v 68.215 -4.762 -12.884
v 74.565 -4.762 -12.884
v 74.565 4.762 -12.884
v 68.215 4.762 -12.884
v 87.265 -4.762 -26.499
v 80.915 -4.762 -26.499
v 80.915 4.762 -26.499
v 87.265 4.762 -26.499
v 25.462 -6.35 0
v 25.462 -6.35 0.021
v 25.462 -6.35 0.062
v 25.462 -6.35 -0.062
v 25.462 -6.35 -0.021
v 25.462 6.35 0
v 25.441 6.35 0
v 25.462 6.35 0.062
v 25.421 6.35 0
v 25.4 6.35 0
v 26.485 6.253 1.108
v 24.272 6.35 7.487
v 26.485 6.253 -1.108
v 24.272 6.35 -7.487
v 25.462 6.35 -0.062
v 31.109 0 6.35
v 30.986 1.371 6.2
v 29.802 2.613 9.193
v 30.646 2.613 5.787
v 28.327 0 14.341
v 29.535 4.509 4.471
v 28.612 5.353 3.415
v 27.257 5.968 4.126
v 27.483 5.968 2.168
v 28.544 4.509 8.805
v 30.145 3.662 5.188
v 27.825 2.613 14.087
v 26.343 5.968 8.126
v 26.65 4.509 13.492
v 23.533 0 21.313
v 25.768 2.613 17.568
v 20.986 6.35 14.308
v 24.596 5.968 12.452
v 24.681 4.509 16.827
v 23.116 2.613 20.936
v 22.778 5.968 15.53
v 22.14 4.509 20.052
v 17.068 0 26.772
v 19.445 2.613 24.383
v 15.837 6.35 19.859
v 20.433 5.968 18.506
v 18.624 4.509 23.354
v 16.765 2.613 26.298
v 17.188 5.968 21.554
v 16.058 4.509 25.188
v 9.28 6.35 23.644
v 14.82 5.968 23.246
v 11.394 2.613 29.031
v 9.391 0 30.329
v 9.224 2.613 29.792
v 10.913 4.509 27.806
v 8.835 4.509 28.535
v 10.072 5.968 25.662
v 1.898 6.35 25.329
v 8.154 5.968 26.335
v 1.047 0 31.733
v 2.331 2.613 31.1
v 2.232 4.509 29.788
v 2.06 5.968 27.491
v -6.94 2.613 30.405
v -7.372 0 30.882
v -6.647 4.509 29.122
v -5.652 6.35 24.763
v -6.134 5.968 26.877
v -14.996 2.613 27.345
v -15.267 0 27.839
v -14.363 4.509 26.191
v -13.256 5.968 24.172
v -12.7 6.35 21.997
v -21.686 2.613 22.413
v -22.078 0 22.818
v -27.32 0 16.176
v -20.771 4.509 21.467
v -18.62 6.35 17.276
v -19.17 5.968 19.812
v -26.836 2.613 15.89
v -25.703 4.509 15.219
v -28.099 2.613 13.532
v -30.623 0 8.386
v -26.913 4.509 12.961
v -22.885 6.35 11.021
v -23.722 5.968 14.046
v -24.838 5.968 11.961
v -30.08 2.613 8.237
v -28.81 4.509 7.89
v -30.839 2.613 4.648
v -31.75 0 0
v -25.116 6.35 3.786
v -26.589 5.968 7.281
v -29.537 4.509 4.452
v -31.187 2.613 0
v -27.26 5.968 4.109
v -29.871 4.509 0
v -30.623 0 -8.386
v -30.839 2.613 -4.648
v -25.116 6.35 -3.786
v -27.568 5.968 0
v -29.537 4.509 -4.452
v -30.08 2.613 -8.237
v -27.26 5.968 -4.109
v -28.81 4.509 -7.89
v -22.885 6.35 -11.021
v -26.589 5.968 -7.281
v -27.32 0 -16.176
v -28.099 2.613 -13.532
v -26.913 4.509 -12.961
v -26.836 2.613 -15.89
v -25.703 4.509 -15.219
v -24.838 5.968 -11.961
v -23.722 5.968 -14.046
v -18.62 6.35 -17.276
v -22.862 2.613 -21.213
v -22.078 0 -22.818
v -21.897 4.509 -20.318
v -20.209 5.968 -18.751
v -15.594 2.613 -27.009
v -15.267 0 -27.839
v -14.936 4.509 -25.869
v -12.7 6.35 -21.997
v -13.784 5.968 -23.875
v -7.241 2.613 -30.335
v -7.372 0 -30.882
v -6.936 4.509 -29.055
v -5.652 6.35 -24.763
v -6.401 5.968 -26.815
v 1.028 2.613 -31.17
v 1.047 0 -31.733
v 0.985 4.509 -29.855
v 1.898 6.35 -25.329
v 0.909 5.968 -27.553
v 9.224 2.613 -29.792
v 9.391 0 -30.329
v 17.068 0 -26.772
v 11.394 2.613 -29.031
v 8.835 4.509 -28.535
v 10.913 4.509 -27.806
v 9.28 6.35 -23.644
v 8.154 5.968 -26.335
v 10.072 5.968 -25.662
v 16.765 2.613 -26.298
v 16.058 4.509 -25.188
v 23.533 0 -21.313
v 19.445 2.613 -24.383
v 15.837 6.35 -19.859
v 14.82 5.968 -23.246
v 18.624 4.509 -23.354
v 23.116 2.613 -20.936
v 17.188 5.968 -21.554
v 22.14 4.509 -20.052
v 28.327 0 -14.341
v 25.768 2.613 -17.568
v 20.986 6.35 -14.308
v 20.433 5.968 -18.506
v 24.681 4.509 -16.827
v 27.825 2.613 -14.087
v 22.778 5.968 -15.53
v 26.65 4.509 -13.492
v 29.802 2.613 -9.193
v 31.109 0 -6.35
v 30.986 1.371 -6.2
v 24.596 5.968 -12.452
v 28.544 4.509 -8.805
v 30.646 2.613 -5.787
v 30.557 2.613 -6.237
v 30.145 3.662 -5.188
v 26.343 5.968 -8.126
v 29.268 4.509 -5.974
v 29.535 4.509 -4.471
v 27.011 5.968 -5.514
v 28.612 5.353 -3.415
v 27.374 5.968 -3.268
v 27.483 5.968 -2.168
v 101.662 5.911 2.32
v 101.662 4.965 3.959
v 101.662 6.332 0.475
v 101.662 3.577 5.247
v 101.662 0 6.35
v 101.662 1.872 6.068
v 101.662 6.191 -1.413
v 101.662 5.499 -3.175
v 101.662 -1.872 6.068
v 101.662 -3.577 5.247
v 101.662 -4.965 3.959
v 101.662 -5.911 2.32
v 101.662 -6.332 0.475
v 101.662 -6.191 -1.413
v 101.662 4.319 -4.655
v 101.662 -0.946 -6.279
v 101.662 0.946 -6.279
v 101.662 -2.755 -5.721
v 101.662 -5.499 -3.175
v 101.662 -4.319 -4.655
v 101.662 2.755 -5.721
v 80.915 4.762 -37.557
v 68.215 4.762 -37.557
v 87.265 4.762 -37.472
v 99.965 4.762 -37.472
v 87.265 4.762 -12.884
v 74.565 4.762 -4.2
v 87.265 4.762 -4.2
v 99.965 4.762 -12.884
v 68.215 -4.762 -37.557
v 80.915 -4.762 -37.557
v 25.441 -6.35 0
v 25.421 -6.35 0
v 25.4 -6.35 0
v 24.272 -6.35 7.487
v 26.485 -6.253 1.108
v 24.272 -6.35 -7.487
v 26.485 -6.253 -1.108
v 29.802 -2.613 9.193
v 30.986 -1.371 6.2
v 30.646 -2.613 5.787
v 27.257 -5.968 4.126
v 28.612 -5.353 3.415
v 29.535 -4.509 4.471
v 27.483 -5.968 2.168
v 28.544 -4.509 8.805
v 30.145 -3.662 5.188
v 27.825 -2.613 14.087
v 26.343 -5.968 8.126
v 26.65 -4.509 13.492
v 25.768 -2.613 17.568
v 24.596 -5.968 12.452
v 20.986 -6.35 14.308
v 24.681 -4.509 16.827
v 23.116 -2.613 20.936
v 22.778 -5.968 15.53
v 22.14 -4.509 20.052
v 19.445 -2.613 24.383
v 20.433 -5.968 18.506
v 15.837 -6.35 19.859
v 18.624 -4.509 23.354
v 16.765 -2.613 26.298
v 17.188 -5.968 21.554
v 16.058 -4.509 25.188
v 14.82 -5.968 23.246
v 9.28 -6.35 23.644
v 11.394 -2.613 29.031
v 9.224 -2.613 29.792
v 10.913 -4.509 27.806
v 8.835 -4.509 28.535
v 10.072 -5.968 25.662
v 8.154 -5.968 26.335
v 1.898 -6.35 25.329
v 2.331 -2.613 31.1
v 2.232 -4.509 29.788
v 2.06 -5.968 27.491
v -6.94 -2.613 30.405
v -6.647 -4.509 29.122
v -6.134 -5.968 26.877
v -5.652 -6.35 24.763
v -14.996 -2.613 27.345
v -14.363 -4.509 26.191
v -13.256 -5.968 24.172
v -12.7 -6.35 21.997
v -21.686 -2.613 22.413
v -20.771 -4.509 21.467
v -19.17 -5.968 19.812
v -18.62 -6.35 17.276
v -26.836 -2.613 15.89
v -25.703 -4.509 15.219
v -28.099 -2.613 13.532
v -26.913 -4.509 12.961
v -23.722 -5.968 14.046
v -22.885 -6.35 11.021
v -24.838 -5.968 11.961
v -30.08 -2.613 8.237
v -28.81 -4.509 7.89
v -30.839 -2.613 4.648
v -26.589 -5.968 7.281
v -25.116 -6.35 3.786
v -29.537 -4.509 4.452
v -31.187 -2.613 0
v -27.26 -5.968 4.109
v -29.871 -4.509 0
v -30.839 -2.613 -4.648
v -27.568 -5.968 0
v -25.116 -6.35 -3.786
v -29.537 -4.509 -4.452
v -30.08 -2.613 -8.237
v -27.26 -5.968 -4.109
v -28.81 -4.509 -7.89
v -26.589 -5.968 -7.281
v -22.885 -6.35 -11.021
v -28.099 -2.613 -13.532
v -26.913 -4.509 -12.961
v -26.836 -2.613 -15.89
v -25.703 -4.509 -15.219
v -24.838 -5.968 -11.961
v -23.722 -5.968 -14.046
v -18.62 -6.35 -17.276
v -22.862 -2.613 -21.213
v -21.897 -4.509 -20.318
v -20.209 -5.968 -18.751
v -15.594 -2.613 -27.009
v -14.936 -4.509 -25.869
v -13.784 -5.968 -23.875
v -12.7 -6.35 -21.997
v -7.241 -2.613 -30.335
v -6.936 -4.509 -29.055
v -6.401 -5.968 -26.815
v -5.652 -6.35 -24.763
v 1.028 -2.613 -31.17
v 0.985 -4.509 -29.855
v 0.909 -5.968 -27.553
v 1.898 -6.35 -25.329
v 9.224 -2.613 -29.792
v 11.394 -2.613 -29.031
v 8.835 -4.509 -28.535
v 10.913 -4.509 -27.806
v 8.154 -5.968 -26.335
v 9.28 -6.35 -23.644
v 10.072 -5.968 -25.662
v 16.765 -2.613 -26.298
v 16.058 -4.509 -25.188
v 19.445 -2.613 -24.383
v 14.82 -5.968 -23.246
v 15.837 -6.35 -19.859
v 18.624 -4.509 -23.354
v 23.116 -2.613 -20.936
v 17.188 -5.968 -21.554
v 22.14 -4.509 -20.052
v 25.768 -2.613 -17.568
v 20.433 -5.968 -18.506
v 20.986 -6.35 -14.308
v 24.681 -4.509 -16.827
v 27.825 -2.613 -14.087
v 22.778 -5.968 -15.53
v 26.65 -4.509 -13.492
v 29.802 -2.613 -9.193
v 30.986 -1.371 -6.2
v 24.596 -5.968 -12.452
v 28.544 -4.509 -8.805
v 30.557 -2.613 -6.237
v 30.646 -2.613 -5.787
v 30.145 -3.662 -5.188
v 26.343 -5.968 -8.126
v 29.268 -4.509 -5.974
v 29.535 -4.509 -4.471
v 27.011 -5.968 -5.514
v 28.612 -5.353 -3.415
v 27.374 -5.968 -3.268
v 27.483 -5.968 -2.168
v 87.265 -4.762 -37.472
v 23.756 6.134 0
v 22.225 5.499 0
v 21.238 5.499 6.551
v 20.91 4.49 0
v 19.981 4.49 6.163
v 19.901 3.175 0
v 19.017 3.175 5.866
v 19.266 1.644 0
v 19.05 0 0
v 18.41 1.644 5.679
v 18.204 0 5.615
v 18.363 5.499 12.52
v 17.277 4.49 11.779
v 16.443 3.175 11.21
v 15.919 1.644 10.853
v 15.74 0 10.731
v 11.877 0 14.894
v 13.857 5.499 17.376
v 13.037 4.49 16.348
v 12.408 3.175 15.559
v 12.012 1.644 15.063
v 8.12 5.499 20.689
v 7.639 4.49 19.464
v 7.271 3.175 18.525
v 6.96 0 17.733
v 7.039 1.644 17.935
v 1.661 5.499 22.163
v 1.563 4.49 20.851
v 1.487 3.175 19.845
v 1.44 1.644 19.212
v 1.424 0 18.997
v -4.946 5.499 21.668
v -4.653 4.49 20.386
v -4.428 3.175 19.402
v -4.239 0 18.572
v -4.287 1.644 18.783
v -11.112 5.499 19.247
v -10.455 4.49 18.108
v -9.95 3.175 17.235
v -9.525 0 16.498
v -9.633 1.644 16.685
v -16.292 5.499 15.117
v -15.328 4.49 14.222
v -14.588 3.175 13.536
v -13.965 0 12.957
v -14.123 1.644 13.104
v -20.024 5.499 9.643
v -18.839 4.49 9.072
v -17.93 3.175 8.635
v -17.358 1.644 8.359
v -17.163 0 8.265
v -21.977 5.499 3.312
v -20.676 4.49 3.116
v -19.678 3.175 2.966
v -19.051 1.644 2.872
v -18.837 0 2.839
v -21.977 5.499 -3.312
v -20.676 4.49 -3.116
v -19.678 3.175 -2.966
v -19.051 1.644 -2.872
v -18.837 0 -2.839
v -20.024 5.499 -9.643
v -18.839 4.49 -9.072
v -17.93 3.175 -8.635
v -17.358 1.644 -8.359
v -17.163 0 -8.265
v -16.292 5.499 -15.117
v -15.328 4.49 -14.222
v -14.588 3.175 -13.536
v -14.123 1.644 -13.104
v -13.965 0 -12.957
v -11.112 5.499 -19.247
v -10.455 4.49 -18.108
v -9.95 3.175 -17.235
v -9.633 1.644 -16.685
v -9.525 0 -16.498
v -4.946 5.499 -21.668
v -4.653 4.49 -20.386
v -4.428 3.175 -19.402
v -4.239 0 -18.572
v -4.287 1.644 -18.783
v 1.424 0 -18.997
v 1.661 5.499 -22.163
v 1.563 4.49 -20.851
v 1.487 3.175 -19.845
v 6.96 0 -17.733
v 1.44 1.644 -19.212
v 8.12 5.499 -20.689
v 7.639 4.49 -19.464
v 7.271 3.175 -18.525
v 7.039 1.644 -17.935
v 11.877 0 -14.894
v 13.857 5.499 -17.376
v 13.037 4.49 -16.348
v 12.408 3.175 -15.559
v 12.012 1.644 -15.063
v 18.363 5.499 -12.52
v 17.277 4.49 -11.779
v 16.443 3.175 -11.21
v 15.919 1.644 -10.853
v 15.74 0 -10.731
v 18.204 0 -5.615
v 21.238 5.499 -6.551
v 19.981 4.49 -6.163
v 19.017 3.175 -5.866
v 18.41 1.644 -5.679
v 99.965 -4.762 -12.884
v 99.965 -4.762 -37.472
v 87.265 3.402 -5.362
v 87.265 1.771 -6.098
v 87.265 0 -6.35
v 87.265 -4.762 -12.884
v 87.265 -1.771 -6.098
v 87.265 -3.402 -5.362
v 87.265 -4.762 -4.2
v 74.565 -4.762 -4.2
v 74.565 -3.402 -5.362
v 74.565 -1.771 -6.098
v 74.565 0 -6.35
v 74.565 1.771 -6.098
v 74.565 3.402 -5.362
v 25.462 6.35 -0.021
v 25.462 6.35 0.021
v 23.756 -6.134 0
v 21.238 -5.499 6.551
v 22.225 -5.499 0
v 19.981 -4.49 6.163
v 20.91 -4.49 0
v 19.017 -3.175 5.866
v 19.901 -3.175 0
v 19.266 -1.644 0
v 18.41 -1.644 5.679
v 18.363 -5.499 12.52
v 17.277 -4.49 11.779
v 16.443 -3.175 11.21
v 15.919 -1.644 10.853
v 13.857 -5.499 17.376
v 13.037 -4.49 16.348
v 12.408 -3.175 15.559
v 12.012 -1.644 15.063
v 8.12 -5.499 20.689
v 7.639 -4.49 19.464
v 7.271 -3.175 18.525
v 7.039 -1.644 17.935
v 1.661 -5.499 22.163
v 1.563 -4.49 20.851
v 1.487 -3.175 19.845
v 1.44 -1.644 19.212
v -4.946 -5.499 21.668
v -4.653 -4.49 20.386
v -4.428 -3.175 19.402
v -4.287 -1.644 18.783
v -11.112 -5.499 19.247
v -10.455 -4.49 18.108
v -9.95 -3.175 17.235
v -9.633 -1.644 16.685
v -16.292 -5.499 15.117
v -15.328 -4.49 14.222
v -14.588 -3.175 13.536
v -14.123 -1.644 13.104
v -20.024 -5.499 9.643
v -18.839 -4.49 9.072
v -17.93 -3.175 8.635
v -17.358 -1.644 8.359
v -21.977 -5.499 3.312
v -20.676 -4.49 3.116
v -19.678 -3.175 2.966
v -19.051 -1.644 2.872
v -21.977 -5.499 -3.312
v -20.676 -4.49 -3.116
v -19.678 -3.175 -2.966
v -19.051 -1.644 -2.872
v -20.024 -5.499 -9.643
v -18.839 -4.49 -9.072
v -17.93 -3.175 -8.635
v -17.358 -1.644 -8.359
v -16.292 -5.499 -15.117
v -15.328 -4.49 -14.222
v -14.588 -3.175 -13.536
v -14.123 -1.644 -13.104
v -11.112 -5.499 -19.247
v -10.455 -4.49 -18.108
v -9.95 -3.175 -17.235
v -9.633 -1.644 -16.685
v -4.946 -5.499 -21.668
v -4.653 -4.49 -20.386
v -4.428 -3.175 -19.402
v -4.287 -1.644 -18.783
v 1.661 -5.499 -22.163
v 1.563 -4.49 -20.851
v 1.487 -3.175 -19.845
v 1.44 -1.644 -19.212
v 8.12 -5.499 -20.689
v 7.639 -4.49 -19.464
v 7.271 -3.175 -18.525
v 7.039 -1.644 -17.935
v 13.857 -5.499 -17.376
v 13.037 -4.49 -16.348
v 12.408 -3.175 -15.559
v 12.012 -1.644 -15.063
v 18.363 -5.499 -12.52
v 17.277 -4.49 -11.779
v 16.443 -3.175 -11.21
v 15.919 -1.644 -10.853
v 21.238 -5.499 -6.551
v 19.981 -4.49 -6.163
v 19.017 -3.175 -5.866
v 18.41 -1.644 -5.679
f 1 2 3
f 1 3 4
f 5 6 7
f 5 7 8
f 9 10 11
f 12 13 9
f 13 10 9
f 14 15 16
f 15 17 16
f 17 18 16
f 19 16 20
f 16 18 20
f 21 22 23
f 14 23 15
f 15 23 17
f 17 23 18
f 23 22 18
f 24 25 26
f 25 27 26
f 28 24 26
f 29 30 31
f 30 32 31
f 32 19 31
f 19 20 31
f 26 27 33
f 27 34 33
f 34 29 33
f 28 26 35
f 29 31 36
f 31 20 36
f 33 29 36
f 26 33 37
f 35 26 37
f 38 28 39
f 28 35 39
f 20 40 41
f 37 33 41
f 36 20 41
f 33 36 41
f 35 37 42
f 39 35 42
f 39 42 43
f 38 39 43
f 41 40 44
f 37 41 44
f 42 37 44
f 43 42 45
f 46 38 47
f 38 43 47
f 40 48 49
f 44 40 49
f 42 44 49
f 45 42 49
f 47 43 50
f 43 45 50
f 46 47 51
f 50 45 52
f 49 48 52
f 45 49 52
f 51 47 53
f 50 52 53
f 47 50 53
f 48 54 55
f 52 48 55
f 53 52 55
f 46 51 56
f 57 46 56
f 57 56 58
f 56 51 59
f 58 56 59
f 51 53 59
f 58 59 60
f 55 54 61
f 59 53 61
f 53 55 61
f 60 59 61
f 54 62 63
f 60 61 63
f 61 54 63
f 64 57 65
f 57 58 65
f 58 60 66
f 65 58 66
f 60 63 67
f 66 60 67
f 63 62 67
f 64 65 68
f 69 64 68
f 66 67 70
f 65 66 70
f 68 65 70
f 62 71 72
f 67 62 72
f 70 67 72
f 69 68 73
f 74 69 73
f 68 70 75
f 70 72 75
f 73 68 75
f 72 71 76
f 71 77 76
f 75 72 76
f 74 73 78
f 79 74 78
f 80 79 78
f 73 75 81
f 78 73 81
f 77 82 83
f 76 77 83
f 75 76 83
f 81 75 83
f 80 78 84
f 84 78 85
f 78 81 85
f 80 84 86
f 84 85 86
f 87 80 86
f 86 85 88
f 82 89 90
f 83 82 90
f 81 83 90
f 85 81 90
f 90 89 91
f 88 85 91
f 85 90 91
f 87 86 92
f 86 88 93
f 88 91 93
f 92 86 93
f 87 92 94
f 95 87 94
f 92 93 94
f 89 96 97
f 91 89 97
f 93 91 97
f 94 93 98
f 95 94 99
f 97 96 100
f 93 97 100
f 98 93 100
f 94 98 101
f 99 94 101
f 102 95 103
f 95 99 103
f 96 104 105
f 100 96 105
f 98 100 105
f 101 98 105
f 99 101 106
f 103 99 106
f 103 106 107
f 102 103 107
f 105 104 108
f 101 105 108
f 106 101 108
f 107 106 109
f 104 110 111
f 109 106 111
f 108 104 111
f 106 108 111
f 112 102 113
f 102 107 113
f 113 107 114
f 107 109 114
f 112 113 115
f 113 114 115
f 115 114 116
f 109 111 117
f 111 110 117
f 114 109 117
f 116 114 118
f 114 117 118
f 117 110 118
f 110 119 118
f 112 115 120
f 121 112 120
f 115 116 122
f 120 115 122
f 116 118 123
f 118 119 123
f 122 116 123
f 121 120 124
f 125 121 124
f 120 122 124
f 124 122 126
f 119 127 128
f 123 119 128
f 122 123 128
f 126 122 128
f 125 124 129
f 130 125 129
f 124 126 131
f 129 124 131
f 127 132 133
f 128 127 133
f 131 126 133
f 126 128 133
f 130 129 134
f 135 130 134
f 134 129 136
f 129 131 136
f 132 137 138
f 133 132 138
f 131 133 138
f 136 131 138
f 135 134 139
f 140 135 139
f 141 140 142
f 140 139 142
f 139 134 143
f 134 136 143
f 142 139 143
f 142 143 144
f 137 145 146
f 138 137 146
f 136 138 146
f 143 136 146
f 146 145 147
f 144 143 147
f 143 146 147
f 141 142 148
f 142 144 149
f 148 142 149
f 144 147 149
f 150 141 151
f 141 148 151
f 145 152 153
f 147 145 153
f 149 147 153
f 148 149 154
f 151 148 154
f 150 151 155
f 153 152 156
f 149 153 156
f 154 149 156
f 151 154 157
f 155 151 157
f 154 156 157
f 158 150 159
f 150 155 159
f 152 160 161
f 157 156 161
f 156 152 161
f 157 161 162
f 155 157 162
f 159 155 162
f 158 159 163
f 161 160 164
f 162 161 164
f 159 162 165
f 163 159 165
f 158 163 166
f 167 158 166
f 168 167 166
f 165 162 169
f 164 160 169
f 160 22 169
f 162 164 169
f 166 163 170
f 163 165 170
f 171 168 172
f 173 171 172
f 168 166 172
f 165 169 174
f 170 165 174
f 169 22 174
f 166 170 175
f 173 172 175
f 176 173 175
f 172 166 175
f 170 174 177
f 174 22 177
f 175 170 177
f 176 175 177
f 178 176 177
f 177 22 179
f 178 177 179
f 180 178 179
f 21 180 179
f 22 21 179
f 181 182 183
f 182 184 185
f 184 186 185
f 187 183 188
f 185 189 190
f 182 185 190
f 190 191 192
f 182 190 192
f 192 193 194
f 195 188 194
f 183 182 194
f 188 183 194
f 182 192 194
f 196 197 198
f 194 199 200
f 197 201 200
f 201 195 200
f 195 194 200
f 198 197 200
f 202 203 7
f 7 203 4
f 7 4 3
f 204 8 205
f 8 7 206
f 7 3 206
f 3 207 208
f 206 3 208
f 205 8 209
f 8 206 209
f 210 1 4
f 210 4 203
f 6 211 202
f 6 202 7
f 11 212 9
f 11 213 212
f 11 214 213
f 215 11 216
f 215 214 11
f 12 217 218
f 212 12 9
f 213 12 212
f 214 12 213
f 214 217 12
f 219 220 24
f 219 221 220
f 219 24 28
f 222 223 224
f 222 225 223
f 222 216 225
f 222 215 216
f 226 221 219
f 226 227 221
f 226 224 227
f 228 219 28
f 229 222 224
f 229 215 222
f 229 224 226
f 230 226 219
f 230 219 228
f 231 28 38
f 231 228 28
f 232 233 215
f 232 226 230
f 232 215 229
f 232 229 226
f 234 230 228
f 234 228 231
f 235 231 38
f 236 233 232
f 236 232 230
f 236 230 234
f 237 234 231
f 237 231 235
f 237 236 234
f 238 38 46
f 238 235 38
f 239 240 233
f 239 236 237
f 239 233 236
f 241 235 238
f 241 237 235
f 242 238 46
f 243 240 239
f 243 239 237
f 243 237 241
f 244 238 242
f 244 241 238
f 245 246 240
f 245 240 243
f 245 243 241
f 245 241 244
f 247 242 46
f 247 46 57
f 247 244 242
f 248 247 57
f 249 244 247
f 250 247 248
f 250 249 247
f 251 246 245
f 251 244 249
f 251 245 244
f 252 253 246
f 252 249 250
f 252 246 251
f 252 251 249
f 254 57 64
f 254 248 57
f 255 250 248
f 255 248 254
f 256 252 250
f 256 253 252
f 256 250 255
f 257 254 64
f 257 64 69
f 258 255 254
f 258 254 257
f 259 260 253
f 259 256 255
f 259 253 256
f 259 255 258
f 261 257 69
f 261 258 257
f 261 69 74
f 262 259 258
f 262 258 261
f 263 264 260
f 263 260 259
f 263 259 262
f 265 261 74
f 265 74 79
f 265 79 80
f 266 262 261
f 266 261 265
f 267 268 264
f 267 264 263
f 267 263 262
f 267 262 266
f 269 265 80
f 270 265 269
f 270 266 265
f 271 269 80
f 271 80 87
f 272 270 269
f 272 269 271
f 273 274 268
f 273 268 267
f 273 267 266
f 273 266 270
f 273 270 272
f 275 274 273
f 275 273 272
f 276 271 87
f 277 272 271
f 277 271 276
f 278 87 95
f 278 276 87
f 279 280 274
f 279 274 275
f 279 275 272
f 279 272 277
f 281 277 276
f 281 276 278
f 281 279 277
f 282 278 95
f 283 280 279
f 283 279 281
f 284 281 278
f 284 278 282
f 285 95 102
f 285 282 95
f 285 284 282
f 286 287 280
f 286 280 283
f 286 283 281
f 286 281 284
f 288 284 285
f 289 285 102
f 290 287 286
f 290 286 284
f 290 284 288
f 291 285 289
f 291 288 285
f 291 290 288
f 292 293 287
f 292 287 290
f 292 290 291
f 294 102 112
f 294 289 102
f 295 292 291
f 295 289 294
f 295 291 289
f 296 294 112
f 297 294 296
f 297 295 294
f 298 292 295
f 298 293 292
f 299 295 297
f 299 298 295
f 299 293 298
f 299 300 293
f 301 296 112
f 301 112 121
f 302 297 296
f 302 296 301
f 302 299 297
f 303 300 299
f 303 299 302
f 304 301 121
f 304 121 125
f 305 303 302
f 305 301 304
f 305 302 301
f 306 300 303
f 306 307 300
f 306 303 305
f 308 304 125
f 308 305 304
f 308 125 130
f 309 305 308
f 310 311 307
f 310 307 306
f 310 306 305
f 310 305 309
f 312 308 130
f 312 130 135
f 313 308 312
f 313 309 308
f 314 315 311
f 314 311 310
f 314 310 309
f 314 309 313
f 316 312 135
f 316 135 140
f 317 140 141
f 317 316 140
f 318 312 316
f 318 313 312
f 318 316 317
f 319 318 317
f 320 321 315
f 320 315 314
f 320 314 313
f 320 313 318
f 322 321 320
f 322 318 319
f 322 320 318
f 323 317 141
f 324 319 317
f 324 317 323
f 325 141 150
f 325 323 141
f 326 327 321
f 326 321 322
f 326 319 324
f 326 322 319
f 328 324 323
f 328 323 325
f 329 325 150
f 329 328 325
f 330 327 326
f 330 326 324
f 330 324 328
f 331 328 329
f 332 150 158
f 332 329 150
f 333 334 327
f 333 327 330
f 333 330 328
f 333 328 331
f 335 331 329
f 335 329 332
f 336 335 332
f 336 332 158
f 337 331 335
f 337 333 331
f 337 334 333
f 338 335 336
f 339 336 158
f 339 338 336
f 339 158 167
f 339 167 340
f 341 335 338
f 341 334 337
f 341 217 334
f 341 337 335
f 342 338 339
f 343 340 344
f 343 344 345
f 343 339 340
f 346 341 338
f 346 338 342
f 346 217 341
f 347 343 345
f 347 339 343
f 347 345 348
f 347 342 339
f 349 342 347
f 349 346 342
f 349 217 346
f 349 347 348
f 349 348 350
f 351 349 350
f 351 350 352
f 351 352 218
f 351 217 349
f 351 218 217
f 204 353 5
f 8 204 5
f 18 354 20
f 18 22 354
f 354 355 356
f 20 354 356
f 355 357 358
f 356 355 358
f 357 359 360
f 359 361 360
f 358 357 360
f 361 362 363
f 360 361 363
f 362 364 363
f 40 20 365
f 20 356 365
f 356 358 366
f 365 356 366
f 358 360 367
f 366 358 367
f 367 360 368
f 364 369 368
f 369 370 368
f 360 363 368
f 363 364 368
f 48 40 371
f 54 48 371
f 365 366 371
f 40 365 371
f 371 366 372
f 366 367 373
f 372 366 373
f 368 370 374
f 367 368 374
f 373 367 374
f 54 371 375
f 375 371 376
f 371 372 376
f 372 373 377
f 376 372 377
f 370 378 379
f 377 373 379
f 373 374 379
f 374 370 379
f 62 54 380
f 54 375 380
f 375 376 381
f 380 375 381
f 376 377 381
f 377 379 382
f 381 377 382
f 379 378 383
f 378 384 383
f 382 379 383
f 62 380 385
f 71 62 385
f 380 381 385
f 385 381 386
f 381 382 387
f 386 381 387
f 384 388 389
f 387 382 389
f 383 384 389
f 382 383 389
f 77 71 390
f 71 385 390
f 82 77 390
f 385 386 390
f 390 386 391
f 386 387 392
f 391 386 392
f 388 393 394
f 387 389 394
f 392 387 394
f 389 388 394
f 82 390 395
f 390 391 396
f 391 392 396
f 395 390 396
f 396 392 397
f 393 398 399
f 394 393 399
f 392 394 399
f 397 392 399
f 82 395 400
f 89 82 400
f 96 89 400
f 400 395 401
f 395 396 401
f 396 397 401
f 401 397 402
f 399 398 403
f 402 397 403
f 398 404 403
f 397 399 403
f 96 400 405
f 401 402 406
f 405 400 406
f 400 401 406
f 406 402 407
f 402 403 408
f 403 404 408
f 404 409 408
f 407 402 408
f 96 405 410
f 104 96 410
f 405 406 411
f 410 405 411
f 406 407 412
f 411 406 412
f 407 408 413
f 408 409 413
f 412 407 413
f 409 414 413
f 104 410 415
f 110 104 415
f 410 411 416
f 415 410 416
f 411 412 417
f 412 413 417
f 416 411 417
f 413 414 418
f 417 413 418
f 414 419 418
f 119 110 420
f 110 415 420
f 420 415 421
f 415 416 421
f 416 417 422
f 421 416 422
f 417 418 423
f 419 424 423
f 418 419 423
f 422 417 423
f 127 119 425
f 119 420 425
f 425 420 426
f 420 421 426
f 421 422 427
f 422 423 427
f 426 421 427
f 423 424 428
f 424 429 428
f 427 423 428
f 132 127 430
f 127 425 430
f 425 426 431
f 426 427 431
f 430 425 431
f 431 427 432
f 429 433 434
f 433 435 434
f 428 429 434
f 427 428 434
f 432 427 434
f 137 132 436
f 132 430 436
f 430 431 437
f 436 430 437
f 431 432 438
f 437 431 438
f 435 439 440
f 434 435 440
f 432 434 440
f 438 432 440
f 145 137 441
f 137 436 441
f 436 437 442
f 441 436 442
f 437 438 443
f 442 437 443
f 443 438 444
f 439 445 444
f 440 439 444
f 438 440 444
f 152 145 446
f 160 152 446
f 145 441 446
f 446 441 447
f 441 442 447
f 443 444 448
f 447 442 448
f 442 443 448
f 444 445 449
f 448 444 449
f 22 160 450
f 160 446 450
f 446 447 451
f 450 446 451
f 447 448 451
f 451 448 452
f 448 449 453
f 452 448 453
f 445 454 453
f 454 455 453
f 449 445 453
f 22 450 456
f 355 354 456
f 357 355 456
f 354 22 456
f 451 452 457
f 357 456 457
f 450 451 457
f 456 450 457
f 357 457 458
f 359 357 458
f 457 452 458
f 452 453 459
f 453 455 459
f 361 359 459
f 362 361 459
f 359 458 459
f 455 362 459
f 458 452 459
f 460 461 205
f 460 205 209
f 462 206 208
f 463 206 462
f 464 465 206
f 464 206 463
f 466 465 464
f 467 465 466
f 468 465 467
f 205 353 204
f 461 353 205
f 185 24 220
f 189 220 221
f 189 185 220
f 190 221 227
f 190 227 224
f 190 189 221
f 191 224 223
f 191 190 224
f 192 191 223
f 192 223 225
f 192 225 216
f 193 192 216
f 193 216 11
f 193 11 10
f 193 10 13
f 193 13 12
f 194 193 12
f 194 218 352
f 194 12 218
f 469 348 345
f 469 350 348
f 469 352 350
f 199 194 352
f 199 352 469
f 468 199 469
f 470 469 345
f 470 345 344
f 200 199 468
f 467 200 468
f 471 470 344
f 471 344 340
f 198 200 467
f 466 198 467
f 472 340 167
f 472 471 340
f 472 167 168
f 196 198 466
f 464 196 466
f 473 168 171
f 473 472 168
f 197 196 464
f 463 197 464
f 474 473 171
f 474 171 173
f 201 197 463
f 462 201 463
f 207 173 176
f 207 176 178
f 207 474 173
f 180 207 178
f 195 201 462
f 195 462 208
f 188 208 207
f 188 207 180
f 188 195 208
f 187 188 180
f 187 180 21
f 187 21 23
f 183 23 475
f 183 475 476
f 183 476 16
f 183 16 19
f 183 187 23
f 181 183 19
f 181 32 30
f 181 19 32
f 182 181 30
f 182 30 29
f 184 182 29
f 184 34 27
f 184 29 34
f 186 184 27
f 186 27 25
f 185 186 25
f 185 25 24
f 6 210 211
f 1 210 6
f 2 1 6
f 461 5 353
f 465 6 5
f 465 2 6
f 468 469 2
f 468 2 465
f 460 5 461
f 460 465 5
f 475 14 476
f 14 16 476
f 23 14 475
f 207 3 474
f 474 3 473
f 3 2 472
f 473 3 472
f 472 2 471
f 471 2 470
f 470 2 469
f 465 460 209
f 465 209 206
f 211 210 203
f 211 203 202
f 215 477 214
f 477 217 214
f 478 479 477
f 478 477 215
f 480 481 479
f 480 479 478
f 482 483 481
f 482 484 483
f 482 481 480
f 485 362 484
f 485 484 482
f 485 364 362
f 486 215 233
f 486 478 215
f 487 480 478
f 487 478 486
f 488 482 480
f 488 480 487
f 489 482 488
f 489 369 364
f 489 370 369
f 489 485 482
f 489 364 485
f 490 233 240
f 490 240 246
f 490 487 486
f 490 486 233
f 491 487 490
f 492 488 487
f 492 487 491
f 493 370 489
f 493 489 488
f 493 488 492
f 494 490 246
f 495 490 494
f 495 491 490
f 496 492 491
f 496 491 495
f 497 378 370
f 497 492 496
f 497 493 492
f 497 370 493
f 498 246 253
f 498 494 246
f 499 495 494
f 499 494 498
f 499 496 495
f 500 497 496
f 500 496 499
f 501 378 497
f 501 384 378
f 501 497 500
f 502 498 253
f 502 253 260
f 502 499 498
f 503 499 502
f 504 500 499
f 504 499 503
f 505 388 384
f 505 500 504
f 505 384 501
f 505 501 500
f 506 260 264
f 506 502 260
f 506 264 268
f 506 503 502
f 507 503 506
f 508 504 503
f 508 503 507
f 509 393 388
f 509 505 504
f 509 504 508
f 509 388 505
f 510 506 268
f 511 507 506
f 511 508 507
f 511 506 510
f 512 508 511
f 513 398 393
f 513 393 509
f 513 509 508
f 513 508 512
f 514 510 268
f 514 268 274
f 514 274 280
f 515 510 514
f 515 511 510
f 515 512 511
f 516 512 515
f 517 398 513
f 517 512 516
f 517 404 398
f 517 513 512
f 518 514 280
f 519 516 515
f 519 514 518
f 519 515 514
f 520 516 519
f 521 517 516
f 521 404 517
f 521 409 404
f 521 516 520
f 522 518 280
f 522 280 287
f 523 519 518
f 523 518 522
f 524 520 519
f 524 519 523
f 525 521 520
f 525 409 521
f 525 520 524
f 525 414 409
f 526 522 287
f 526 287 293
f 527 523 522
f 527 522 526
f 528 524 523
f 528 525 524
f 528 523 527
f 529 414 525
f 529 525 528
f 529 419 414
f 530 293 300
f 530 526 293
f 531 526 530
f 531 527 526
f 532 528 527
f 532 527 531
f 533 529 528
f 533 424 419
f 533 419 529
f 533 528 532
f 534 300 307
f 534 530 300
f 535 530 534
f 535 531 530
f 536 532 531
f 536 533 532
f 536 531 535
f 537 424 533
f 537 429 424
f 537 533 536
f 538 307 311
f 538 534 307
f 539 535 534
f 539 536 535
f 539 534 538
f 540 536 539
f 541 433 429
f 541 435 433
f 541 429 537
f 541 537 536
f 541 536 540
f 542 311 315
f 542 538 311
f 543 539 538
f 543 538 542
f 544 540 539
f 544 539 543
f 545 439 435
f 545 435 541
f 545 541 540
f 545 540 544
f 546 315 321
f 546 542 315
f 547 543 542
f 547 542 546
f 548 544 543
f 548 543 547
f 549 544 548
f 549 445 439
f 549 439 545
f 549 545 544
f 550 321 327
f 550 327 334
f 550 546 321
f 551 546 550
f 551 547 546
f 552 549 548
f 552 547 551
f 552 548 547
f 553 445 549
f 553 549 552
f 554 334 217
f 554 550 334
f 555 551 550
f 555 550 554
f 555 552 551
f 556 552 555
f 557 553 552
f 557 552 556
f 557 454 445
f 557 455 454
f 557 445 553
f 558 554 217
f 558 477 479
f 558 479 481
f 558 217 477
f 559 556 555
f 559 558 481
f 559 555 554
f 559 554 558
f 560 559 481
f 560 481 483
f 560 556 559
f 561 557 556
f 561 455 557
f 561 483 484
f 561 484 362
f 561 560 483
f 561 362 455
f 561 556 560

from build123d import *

# Parameters (mm, degrees)
F0_R     = 31.75
F0_R_2   = 19.05
F1_DEPTH = 6.35
F2_R     = 6.34999
F3_R     = 6.34999
F4_W     = 76.2
F4_H     = 6.35
F6_W     = 12.7
F6_H     = 12.7
F6_H_2   = 10.9727999343
F7_DEPTH = 4.7625


# Not quite as in the source:
# - a fillet or chamfer is up to 0.001 mm smaller than in the source, because OpenCascade refuses the exact size


with BuildPart() as f1:
    # F0 (on Front) → F1 (new body, symmetric)
    with BuildSketch(Plane.XZ):
        Circle(F0_R)
        Circle(F0_R_2, mode=Mode.SUBTRACT)
    extrude(amount=F1_DEPTH, both=True)

    # F2 (radius 6.35 in the source; OpenCascade refuses exactly that, so slightly less here)
    f2_edges = [f1.edges().sort_by_distance(p)[0] for p in [
        (-31.75, -6.35, 0),
        (-31.75, 6.35, 0),
    ]]
    fillet(f2_edges, radius=F2_R)

    # F3 (radius 6.35 in the source; OpenCascade refuses exactly that, so slightly less here)
    f3_edges = [f1.edges().sort_by_distance(p)[0] for p in [
        (-19.05, -6.35, 0),
        (-19.05, 6.35, 0),
    ]]
    fillet(f3_edges, radius=F3_R)

    # F4 (on Front) → F5 (revolve)
    with BuildSketch(Plane.XZ):
        with Locations((63.5620742053, 3.175)):
            Rectangle(F4_W, F4_H)
    revolve(axis=Axis((63.5620742053, 0, 0), (1, 0, 0)))

    # F6 (on Front) → F7 (join, symmetric)
    with BuildSketch(Plane.XZ):
        with Locations((80.9154223323, -6.5343625903)):
            Rectangle(F6_W, F6_H)
        Polygon((87.2654223323, -12.8843625903), (74.5654223323, -12.8843625903), (68.2154223323, -12.8843625903), (68.2154223323, -26.4987673753), (74.5654223323, -26.4987673753), (80.9154223323, -26.4987673753), (87.2654223323, -26.4987673753), (99.9654223323, -26.4987673753), (99.9654223323, -12.8843625903), align=None)
        Polygon((74.5654223323, -26.4987673753), (68.2154223323, -26.4987673753), (68.2154223323, -37.5571879506), (80.9154223323, -37.5571879506), (80.9154223323, -26.4987673753), align=None)
        with Locations((93.6154223323, -31.9851673424)):
            Rectangle(F6_W, F6_H_2)
    extrude(amount=F7_DEPTH, both=True)


solid = f1.part
